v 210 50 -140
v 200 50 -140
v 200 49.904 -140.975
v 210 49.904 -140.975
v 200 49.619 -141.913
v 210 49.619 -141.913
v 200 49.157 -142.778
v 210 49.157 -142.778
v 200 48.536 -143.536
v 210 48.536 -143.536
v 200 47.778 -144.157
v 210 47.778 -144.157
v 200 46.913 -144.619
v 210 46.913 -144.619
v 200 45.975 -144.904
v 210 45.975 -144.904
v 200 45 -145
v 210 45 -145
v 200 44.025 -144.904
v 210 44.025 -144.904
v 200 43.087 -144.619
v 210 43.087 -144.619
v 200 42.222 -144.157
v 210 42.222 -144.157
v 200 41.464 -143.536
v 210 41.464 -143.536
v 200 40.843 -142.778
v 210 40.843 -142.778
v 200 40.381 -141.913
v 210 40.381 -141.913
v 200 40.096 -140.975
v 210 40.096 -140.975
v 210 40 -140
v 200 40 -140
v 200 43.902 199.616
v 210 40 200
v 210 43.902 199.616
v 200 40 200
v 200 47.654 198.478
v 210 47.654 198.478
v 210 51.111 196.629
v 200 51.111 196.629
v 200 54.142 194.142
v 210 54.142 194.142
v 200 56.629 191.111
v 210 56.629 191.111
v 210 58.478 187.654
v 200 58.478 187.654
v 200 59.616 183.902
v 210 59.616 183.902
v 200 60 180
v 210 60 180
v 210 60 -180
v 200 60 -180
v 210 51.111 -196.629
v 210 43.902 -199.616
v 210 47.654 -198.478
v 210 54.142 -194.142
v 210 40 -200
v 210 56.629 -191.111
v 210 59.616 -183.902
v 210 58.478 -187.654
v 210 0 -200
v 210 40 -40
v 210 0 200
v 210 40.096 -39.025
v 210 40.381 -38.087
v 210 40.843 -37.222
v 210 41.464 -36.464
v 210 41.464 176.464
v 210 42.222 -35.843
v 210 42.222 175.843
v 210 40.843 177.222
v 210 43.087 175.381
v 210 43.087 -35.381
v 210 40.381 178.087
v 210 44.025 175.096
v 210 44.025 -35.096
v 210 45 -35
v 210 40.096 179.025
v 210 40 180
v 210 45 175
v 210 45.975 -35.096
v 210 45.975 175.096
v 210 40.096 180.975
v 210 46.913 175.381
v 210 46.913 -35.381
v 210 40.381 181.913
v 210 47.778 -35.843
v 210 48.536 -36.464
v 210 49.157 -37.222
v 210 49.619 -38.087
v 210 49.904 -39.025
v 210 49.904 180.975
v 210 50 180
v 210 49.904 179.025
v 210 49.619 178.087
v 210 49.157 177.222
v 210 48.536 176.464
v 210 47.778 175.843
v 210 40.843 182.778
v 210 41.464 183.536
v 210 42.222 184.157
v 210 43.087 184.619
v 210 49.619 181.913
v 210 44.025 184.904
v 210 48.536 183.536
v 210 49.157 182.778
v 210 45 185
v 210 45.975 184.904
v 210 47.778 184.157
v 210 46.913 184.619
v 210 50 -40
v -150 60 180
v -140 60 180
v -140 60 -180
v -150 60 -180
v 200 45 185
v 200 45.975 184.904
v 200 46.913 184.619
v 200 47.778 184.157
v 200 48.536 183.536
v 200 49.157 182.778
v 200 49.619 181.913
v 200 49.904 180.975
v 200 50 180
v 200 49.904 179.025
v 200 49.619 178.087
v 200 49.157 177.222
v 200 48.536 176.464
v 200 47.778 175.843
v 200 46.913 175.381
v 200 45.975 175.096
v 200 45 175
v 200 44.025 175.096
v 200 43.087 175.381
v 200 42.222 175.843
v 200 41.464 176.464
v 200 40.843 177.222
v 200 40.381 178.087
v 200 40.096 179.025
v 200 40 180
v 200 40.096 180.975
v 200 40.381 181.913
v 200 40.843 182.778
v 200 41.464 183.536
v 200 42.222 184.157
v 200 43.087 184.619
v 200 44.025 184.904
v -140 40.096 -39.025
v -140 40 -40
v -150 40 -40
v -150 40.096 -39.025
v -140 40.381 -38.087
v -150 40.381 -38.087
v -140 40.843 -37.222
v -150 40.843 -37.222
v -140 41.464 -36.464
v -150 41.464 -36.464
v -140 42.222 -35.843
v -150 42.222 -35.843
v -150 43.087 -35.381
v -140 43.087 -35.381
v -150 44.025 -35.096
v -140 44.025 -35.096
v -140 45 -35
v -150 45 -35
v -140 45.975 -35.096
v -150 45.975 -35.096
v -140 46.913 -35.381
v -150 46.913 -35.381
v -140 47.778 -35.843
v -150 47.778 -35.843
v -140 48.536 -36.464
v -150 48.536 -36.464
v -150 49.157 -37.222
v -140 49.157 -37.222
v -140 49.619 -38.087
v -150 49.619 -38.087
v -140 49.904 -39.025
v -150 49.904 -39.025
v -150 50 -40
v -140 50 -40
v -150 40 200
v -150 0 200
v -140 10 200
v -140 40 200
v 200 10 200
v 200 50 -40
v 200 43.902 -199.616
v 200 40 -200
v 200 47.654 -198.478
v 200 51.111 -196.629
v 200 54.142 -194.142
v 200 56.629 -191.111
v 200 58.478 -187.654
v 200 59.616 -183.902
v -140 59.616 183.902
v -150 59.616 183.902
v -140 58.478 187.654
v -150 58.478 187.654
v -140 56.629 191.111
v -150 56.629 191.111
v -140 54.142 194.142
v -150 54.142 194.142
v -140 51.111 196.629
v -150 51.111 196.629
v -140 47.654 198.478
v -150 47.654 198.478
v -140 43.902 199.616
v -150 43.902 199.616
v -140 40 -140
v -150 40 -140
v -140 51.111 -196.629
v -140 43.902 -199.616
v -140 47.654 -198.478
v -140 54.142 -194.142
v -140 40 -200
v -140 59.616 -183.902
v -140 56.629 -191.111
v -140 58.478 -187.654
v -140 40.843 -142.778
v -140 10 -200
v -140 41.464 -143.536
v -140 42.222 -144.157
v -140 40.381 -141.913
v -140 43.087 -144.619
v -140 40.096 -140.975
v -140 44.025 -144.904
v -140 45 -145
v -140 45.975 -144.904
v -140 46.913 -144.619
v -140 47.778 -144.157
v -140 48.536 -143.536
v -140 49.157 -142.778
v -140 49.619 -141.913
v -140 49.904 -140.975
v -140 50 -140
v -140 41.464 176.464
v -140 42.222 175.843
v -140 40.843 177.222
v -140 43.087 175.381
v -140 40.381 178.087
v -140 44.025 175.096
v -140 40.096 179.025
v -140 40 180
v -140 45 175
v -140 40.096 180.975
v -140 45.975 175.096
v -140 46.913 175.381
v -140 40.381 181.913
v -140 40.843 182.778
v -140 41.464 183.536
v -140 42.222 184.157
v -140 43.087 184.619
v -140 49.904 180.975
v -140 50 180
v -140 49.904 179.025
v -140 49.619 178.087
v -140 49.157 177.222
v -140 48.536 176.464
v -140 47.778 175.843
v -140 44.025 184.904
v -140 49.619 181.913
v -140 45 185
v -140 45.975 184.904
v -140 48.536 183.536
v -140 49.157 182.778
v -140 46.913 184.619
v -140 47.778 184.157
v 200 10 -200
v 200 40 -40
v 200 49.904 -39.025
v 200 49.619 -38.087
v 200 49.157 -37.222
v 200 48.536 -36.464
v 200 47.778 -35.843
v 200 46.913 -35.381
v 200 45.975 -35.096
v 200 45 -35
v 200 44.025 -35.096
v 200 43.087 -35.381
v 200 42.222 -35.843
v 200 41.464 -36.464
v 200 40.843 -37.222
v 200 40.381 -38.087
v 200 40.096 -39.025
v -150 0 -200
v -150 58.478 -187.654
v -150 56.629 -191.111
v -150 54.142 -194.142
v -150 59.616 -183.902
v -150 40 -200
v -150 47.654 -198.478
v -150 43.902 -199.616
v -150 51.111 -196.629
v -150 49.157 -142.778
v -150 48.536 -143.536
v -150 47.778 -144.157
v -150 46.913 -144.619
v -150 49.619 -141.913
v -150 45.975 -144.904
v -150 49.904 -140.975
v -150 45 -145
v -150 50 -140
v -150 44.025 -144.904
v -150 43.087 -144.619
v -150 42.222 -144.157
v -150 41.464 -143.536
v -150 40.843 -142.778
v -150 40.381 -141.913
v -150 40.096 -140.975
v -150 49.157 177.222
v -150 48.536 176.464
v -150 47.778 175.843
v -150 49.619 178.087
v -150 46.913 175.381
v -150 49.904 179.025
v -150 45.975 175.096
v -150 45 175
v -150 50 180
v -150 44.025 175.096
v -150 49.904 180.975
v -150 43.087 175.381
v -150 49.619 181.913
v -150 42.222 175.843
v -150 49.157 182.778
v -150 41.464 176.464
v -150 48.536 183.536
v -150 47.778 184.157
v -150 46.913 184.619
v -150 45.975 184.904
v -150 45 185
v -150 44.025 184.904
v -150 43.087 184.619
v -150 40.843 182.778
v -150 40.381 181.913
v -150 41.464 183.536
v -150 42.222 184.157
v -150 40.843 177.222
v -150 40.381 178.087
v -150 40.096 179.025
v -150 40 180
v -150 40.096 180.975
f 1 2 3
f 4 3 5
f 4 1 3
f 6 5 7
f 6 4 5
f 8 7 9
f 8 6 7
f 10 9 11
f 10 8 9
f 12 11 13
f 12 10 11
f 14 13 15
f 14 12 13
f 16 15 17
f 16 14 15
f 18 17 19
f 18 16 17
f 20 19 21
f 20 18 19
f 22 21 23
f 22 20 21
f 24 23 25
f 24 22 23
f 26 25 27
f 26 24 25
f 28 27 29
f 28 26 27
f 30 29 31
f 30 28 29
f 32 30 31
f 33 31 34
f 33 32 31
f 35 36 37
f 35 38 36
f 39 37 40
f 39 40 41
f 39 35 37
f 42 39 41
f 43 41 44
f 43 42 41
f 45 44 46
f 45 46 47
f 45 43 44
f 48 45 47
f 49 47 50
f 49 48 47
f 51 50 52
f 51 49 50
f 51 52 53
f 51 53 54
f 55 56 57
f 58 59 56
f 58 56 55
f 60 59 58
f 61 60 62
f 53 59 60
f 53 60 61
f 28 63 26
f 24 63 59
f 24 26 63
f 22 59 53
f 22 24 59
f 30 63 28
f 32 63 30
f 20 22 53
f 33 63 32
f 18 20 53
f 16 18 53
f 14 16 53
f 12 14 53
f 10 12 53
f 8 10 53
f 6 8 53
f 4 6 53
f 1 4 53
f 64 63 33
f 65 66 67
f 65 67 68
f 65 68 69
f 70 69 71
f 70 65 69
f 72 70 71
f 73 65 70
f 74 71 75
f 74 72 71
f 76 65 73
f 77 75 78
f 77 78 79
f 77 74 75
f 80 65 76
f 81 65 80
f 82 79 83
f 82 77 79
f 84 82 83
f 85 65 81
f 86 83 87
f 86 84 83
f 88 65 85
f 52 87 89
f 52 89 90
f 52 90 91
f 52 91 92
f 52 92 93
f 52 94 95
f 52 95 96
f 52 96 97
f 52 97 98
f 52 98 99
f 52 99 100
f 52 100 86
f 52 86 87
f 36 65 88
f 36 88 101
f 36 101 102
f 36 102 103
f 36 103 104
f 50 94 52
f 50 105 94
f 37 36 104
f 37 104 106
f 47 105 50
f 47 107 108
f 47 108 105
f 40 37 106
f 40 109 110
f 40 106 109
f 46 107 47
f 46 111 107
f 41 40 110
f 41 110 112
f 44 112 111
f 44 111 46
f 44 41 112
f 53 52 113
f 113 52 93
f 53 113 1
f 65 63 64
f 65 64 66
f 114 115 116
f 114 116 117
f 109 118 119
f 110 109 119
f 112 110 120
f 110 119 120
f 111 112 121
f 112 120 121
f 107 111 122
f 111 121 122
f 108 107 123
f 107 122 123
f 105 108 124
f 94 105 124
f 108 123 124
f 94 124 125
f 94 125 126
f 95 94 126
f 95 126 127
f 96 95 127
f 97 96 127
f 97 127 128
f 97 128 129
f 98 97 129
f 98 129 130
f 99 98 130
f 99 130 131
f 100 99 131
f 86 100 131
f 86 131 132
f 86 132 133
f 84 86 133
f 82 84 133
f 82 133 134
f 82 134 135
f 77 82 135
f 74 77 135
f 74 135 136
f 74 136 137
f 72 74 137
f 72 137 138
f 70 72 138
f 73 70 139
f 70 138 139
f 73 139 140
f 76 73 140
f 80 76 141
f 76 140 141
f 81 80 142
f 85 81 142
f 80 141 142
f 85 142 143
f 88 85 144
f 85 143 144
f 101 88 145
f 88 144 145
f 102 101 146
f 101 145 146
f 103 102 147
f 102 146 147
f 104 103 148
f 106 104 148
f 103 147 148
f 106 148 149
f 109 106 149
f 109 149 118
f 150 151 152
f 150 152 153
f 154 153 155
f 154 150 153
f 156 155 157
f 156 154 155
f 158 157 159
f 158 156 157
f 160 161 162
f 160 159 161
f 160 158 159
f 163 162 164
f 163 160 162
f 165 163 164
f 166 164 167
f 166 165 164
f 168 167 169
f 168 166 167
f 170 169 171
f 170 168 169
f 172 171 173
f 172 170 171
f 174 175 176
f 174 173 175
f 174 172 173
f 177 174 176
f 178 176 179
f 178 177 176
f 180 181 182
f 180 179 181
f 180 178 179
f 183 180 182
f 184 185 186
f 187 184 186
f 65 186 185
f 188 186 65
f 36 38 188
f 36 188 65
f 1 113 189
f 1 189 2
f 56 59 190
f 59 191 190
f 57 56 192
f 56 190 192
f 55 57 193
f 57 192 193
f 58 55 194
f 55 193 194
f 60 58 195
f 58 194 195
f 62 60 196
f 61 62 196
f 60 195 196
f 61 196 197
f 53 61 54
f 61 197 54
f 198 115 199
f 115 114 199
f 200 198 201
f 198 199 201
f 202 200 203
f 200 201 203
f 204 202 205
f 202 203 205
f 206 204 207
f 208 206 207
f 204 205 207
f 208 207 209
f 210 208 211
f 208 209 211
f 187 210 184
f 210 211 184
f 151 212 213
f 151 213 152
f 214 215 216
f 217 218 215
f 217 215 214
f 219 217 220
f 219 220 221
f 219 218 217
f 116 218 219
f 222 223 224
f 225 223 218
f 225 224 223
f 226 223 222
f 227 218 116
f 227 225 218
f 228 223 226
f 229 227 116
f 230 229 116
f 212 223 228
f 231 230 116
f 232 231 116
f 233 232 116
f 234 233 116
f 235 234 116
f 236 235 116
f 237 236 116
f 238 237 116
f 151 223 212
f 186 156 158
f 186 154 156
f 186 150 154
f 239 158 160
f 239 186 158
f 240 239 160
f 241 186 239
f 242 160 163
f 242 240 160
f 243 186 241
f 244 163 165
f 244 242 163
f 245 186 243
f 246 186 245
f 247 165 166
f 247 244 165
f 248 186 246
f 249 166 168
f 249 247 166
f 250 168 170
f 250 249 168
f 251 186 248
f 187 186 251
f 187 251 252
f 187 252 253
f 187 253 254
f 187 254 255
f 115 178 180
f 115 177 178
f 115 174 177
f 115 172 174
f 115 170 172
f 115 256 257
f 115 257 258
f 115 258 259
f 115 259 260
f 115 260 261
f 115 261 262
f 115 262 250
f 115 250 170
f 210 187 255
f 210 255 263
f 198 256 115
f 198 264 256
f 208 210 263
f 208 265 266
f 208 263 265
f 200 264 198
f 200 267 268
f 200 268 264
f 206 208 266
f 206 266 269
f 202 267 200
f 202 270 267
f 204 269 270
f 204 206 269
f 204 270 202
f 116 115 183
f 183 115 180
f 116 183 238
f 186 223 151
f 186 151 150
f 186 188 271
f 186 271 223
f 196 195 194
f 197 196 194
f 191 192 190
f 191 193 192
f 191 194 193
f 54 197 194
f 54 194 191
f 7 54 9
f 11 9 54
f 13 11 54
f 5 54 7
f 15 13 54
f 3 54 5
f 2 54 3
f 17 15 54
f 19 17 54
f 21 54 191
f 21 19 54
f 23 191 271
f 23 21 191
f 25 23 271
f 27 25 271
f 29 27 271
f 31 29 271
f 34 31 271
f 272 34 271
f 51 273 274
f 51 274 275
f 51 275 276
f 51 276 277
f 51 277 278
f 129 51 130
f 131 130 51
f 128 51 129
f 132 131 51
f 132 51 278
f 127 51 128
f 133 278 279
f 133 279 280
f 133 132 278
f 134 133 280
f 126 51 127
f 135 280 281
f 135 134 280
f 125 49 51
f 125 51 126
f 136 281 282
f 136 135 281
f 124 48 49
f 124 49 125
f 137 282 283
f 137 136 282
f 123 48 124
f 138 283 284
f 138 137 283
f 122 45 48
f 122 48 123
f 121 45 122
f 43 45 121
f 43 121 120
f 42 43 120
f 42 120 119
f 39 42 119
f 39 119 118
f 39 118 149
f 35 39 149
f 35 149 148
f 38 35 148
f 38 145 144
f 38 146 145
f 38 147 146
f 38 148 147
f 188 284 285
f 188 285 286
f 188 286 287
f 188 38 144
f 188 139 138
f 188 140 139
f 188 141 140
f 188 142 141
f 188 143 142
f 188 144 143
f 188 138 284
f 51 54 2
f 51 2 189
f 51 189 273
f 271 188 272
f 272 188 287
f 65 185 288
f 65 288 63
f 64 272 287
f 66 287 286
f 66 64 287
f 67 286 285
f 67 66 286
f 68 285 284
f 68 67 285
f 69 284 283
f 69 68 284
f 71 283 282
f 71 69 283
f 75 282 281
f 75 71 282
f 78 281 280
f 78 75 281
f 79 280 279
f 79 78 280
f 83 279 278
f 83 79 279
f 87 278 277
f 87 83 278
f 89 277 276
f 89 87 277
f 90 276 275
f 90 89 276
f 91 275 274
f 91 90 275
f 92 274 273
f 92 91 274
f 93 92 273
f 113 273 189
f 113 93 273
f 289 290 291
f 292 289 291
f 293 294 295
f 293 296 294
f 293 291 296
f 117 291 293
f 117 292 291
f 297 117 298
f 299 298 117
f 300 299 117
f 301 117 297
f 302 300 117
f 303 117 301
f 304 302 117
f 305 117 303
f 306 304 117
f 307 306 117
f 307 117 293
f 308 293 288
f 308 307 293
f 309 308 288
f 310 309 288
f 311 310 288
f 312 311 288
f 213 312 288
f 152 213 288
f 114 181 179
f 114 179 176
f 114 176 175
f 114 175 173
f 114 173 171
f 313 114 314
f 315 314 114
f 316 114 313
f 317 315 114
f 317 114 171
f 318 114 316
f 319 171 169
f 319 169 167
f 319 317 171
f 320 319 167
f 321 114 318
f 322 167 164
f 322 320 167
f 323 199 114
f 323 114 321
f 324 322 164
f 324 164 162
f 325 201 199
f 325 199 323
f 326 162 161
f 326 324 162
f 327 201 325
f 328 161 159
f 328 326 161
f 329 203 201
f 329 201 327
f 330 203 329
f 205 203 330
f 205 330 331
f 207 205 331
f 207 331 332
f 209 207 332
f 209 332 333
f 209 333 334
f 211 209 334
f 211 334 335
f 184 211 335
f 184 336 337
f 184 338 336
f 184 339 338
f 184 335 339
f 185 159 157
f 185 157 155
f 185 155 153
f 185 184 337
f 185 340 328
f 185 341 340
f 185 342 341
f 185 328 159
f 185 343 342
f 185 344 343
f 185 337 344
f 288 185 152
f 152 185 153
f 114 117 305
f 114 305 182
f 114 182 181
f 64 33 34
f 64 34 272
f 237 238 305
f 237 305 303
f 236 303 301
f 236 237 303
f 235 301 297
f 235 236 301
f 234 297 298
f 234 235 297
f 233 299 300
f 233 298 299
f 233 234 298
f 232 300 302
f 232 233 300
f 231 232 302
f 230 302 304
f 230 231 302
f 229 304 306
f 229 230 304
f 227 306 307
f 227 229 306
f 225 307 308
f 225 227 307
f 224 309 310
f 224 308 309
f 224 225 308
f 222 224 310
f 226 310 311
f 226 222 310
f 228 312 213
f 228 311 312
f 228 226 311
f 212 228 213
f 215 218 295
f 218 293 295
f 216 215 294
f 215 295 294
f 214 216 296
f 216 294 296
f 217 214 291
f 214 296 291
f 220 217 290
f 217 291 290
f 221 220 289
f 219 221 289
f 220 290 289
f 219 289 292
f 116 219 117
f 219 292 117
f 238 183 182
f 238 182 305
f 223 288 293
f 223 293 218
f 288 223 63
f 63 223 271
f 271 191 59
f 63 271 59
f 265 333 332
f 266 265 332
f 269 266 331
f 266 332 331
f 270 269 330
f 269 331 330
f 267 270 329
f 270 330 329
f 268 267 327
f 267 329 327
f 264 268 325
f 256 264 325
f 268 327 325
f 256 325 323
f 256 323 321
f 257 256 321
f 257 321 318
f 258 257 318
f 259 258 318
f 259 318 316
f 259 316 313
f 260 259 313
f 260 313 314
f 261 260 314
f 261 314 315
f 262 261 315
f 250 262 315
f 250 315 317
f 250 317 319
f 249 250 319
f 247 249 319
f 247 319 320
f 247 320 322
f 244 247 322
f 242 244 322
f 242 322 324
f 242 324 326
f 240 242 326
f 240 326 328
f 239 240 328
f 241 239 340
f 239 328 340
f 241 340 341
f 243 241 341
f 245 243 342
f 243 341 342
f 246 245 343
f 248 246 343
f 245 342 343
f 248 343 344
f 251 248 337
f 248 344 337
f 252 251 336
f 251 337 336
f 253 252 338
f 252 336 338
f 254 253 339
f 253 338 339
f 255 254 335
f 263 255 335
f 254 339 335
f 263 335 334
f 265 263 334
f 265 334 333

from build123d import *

# Parameters (mm, degrees)
EXTRUDE_THIN1_DEPTH = 200
CUT_EXTRUDE1_DEPTH  = 364
FILLET1_R           = 20
SKETCH3_R           = 5
CUT_EXTRUDE2_DEPTH  = 417.173040934


with BuildPart() as part:
    # Sketch1 → Extrude-Thin1 (new, symmetric)
    with BuildSketch(Plane.XY):
        Polygon((-150, 60), (-150, 0), (210, 0), (210, 60), (200, 60), (200, 10), (-140, 10), (-140, 60), align=None)
    extrude(amount=EXTRUDE_THIN1_DEPTH, both=True)

    # Sketch2 → Cut-Extrude1 (cut)
    with BuildSketch(Plane(origin=(210, 0, 0), x_dir=(0, 0, -1), z_dir=(1, 0, 0))):
        with BuildLine():
            Line((40, 50), (140, 50))
            ThreePointArc((140, 50), (145, 45), (140, 40))
            Line((140, 40), (40, 40))
            ThreePointArc((40, 40), (35, 45), (40, 50))
        make_face()
    extrude(amount=-CUT_EXTRUDE1_DEPTH, mode=Mode.SUBTRACT)

    # Fillet1
    fillet1_edges = [part.edges().sort_by_distance(p)[0] for p in [
        (205, 60, 200),
        (-145, 60, 200),
        (205, 60, -200),
        (-145, 60, -200),
    ]]
    fillet(fillet1_edges, radius=FILLET1_R)

    # Sketch3 → Cut-Extrude2 (cut, through all)
    with BuildSketch(Plane.ZY.offset(150)):
        with Locations((180, 45)):
            Circle(SKETCH3_R)
    extrude(amount=-CUT_EXTRUDE2_DEPTH, mode=Mode.SUBTRACT)


solid = part.part
